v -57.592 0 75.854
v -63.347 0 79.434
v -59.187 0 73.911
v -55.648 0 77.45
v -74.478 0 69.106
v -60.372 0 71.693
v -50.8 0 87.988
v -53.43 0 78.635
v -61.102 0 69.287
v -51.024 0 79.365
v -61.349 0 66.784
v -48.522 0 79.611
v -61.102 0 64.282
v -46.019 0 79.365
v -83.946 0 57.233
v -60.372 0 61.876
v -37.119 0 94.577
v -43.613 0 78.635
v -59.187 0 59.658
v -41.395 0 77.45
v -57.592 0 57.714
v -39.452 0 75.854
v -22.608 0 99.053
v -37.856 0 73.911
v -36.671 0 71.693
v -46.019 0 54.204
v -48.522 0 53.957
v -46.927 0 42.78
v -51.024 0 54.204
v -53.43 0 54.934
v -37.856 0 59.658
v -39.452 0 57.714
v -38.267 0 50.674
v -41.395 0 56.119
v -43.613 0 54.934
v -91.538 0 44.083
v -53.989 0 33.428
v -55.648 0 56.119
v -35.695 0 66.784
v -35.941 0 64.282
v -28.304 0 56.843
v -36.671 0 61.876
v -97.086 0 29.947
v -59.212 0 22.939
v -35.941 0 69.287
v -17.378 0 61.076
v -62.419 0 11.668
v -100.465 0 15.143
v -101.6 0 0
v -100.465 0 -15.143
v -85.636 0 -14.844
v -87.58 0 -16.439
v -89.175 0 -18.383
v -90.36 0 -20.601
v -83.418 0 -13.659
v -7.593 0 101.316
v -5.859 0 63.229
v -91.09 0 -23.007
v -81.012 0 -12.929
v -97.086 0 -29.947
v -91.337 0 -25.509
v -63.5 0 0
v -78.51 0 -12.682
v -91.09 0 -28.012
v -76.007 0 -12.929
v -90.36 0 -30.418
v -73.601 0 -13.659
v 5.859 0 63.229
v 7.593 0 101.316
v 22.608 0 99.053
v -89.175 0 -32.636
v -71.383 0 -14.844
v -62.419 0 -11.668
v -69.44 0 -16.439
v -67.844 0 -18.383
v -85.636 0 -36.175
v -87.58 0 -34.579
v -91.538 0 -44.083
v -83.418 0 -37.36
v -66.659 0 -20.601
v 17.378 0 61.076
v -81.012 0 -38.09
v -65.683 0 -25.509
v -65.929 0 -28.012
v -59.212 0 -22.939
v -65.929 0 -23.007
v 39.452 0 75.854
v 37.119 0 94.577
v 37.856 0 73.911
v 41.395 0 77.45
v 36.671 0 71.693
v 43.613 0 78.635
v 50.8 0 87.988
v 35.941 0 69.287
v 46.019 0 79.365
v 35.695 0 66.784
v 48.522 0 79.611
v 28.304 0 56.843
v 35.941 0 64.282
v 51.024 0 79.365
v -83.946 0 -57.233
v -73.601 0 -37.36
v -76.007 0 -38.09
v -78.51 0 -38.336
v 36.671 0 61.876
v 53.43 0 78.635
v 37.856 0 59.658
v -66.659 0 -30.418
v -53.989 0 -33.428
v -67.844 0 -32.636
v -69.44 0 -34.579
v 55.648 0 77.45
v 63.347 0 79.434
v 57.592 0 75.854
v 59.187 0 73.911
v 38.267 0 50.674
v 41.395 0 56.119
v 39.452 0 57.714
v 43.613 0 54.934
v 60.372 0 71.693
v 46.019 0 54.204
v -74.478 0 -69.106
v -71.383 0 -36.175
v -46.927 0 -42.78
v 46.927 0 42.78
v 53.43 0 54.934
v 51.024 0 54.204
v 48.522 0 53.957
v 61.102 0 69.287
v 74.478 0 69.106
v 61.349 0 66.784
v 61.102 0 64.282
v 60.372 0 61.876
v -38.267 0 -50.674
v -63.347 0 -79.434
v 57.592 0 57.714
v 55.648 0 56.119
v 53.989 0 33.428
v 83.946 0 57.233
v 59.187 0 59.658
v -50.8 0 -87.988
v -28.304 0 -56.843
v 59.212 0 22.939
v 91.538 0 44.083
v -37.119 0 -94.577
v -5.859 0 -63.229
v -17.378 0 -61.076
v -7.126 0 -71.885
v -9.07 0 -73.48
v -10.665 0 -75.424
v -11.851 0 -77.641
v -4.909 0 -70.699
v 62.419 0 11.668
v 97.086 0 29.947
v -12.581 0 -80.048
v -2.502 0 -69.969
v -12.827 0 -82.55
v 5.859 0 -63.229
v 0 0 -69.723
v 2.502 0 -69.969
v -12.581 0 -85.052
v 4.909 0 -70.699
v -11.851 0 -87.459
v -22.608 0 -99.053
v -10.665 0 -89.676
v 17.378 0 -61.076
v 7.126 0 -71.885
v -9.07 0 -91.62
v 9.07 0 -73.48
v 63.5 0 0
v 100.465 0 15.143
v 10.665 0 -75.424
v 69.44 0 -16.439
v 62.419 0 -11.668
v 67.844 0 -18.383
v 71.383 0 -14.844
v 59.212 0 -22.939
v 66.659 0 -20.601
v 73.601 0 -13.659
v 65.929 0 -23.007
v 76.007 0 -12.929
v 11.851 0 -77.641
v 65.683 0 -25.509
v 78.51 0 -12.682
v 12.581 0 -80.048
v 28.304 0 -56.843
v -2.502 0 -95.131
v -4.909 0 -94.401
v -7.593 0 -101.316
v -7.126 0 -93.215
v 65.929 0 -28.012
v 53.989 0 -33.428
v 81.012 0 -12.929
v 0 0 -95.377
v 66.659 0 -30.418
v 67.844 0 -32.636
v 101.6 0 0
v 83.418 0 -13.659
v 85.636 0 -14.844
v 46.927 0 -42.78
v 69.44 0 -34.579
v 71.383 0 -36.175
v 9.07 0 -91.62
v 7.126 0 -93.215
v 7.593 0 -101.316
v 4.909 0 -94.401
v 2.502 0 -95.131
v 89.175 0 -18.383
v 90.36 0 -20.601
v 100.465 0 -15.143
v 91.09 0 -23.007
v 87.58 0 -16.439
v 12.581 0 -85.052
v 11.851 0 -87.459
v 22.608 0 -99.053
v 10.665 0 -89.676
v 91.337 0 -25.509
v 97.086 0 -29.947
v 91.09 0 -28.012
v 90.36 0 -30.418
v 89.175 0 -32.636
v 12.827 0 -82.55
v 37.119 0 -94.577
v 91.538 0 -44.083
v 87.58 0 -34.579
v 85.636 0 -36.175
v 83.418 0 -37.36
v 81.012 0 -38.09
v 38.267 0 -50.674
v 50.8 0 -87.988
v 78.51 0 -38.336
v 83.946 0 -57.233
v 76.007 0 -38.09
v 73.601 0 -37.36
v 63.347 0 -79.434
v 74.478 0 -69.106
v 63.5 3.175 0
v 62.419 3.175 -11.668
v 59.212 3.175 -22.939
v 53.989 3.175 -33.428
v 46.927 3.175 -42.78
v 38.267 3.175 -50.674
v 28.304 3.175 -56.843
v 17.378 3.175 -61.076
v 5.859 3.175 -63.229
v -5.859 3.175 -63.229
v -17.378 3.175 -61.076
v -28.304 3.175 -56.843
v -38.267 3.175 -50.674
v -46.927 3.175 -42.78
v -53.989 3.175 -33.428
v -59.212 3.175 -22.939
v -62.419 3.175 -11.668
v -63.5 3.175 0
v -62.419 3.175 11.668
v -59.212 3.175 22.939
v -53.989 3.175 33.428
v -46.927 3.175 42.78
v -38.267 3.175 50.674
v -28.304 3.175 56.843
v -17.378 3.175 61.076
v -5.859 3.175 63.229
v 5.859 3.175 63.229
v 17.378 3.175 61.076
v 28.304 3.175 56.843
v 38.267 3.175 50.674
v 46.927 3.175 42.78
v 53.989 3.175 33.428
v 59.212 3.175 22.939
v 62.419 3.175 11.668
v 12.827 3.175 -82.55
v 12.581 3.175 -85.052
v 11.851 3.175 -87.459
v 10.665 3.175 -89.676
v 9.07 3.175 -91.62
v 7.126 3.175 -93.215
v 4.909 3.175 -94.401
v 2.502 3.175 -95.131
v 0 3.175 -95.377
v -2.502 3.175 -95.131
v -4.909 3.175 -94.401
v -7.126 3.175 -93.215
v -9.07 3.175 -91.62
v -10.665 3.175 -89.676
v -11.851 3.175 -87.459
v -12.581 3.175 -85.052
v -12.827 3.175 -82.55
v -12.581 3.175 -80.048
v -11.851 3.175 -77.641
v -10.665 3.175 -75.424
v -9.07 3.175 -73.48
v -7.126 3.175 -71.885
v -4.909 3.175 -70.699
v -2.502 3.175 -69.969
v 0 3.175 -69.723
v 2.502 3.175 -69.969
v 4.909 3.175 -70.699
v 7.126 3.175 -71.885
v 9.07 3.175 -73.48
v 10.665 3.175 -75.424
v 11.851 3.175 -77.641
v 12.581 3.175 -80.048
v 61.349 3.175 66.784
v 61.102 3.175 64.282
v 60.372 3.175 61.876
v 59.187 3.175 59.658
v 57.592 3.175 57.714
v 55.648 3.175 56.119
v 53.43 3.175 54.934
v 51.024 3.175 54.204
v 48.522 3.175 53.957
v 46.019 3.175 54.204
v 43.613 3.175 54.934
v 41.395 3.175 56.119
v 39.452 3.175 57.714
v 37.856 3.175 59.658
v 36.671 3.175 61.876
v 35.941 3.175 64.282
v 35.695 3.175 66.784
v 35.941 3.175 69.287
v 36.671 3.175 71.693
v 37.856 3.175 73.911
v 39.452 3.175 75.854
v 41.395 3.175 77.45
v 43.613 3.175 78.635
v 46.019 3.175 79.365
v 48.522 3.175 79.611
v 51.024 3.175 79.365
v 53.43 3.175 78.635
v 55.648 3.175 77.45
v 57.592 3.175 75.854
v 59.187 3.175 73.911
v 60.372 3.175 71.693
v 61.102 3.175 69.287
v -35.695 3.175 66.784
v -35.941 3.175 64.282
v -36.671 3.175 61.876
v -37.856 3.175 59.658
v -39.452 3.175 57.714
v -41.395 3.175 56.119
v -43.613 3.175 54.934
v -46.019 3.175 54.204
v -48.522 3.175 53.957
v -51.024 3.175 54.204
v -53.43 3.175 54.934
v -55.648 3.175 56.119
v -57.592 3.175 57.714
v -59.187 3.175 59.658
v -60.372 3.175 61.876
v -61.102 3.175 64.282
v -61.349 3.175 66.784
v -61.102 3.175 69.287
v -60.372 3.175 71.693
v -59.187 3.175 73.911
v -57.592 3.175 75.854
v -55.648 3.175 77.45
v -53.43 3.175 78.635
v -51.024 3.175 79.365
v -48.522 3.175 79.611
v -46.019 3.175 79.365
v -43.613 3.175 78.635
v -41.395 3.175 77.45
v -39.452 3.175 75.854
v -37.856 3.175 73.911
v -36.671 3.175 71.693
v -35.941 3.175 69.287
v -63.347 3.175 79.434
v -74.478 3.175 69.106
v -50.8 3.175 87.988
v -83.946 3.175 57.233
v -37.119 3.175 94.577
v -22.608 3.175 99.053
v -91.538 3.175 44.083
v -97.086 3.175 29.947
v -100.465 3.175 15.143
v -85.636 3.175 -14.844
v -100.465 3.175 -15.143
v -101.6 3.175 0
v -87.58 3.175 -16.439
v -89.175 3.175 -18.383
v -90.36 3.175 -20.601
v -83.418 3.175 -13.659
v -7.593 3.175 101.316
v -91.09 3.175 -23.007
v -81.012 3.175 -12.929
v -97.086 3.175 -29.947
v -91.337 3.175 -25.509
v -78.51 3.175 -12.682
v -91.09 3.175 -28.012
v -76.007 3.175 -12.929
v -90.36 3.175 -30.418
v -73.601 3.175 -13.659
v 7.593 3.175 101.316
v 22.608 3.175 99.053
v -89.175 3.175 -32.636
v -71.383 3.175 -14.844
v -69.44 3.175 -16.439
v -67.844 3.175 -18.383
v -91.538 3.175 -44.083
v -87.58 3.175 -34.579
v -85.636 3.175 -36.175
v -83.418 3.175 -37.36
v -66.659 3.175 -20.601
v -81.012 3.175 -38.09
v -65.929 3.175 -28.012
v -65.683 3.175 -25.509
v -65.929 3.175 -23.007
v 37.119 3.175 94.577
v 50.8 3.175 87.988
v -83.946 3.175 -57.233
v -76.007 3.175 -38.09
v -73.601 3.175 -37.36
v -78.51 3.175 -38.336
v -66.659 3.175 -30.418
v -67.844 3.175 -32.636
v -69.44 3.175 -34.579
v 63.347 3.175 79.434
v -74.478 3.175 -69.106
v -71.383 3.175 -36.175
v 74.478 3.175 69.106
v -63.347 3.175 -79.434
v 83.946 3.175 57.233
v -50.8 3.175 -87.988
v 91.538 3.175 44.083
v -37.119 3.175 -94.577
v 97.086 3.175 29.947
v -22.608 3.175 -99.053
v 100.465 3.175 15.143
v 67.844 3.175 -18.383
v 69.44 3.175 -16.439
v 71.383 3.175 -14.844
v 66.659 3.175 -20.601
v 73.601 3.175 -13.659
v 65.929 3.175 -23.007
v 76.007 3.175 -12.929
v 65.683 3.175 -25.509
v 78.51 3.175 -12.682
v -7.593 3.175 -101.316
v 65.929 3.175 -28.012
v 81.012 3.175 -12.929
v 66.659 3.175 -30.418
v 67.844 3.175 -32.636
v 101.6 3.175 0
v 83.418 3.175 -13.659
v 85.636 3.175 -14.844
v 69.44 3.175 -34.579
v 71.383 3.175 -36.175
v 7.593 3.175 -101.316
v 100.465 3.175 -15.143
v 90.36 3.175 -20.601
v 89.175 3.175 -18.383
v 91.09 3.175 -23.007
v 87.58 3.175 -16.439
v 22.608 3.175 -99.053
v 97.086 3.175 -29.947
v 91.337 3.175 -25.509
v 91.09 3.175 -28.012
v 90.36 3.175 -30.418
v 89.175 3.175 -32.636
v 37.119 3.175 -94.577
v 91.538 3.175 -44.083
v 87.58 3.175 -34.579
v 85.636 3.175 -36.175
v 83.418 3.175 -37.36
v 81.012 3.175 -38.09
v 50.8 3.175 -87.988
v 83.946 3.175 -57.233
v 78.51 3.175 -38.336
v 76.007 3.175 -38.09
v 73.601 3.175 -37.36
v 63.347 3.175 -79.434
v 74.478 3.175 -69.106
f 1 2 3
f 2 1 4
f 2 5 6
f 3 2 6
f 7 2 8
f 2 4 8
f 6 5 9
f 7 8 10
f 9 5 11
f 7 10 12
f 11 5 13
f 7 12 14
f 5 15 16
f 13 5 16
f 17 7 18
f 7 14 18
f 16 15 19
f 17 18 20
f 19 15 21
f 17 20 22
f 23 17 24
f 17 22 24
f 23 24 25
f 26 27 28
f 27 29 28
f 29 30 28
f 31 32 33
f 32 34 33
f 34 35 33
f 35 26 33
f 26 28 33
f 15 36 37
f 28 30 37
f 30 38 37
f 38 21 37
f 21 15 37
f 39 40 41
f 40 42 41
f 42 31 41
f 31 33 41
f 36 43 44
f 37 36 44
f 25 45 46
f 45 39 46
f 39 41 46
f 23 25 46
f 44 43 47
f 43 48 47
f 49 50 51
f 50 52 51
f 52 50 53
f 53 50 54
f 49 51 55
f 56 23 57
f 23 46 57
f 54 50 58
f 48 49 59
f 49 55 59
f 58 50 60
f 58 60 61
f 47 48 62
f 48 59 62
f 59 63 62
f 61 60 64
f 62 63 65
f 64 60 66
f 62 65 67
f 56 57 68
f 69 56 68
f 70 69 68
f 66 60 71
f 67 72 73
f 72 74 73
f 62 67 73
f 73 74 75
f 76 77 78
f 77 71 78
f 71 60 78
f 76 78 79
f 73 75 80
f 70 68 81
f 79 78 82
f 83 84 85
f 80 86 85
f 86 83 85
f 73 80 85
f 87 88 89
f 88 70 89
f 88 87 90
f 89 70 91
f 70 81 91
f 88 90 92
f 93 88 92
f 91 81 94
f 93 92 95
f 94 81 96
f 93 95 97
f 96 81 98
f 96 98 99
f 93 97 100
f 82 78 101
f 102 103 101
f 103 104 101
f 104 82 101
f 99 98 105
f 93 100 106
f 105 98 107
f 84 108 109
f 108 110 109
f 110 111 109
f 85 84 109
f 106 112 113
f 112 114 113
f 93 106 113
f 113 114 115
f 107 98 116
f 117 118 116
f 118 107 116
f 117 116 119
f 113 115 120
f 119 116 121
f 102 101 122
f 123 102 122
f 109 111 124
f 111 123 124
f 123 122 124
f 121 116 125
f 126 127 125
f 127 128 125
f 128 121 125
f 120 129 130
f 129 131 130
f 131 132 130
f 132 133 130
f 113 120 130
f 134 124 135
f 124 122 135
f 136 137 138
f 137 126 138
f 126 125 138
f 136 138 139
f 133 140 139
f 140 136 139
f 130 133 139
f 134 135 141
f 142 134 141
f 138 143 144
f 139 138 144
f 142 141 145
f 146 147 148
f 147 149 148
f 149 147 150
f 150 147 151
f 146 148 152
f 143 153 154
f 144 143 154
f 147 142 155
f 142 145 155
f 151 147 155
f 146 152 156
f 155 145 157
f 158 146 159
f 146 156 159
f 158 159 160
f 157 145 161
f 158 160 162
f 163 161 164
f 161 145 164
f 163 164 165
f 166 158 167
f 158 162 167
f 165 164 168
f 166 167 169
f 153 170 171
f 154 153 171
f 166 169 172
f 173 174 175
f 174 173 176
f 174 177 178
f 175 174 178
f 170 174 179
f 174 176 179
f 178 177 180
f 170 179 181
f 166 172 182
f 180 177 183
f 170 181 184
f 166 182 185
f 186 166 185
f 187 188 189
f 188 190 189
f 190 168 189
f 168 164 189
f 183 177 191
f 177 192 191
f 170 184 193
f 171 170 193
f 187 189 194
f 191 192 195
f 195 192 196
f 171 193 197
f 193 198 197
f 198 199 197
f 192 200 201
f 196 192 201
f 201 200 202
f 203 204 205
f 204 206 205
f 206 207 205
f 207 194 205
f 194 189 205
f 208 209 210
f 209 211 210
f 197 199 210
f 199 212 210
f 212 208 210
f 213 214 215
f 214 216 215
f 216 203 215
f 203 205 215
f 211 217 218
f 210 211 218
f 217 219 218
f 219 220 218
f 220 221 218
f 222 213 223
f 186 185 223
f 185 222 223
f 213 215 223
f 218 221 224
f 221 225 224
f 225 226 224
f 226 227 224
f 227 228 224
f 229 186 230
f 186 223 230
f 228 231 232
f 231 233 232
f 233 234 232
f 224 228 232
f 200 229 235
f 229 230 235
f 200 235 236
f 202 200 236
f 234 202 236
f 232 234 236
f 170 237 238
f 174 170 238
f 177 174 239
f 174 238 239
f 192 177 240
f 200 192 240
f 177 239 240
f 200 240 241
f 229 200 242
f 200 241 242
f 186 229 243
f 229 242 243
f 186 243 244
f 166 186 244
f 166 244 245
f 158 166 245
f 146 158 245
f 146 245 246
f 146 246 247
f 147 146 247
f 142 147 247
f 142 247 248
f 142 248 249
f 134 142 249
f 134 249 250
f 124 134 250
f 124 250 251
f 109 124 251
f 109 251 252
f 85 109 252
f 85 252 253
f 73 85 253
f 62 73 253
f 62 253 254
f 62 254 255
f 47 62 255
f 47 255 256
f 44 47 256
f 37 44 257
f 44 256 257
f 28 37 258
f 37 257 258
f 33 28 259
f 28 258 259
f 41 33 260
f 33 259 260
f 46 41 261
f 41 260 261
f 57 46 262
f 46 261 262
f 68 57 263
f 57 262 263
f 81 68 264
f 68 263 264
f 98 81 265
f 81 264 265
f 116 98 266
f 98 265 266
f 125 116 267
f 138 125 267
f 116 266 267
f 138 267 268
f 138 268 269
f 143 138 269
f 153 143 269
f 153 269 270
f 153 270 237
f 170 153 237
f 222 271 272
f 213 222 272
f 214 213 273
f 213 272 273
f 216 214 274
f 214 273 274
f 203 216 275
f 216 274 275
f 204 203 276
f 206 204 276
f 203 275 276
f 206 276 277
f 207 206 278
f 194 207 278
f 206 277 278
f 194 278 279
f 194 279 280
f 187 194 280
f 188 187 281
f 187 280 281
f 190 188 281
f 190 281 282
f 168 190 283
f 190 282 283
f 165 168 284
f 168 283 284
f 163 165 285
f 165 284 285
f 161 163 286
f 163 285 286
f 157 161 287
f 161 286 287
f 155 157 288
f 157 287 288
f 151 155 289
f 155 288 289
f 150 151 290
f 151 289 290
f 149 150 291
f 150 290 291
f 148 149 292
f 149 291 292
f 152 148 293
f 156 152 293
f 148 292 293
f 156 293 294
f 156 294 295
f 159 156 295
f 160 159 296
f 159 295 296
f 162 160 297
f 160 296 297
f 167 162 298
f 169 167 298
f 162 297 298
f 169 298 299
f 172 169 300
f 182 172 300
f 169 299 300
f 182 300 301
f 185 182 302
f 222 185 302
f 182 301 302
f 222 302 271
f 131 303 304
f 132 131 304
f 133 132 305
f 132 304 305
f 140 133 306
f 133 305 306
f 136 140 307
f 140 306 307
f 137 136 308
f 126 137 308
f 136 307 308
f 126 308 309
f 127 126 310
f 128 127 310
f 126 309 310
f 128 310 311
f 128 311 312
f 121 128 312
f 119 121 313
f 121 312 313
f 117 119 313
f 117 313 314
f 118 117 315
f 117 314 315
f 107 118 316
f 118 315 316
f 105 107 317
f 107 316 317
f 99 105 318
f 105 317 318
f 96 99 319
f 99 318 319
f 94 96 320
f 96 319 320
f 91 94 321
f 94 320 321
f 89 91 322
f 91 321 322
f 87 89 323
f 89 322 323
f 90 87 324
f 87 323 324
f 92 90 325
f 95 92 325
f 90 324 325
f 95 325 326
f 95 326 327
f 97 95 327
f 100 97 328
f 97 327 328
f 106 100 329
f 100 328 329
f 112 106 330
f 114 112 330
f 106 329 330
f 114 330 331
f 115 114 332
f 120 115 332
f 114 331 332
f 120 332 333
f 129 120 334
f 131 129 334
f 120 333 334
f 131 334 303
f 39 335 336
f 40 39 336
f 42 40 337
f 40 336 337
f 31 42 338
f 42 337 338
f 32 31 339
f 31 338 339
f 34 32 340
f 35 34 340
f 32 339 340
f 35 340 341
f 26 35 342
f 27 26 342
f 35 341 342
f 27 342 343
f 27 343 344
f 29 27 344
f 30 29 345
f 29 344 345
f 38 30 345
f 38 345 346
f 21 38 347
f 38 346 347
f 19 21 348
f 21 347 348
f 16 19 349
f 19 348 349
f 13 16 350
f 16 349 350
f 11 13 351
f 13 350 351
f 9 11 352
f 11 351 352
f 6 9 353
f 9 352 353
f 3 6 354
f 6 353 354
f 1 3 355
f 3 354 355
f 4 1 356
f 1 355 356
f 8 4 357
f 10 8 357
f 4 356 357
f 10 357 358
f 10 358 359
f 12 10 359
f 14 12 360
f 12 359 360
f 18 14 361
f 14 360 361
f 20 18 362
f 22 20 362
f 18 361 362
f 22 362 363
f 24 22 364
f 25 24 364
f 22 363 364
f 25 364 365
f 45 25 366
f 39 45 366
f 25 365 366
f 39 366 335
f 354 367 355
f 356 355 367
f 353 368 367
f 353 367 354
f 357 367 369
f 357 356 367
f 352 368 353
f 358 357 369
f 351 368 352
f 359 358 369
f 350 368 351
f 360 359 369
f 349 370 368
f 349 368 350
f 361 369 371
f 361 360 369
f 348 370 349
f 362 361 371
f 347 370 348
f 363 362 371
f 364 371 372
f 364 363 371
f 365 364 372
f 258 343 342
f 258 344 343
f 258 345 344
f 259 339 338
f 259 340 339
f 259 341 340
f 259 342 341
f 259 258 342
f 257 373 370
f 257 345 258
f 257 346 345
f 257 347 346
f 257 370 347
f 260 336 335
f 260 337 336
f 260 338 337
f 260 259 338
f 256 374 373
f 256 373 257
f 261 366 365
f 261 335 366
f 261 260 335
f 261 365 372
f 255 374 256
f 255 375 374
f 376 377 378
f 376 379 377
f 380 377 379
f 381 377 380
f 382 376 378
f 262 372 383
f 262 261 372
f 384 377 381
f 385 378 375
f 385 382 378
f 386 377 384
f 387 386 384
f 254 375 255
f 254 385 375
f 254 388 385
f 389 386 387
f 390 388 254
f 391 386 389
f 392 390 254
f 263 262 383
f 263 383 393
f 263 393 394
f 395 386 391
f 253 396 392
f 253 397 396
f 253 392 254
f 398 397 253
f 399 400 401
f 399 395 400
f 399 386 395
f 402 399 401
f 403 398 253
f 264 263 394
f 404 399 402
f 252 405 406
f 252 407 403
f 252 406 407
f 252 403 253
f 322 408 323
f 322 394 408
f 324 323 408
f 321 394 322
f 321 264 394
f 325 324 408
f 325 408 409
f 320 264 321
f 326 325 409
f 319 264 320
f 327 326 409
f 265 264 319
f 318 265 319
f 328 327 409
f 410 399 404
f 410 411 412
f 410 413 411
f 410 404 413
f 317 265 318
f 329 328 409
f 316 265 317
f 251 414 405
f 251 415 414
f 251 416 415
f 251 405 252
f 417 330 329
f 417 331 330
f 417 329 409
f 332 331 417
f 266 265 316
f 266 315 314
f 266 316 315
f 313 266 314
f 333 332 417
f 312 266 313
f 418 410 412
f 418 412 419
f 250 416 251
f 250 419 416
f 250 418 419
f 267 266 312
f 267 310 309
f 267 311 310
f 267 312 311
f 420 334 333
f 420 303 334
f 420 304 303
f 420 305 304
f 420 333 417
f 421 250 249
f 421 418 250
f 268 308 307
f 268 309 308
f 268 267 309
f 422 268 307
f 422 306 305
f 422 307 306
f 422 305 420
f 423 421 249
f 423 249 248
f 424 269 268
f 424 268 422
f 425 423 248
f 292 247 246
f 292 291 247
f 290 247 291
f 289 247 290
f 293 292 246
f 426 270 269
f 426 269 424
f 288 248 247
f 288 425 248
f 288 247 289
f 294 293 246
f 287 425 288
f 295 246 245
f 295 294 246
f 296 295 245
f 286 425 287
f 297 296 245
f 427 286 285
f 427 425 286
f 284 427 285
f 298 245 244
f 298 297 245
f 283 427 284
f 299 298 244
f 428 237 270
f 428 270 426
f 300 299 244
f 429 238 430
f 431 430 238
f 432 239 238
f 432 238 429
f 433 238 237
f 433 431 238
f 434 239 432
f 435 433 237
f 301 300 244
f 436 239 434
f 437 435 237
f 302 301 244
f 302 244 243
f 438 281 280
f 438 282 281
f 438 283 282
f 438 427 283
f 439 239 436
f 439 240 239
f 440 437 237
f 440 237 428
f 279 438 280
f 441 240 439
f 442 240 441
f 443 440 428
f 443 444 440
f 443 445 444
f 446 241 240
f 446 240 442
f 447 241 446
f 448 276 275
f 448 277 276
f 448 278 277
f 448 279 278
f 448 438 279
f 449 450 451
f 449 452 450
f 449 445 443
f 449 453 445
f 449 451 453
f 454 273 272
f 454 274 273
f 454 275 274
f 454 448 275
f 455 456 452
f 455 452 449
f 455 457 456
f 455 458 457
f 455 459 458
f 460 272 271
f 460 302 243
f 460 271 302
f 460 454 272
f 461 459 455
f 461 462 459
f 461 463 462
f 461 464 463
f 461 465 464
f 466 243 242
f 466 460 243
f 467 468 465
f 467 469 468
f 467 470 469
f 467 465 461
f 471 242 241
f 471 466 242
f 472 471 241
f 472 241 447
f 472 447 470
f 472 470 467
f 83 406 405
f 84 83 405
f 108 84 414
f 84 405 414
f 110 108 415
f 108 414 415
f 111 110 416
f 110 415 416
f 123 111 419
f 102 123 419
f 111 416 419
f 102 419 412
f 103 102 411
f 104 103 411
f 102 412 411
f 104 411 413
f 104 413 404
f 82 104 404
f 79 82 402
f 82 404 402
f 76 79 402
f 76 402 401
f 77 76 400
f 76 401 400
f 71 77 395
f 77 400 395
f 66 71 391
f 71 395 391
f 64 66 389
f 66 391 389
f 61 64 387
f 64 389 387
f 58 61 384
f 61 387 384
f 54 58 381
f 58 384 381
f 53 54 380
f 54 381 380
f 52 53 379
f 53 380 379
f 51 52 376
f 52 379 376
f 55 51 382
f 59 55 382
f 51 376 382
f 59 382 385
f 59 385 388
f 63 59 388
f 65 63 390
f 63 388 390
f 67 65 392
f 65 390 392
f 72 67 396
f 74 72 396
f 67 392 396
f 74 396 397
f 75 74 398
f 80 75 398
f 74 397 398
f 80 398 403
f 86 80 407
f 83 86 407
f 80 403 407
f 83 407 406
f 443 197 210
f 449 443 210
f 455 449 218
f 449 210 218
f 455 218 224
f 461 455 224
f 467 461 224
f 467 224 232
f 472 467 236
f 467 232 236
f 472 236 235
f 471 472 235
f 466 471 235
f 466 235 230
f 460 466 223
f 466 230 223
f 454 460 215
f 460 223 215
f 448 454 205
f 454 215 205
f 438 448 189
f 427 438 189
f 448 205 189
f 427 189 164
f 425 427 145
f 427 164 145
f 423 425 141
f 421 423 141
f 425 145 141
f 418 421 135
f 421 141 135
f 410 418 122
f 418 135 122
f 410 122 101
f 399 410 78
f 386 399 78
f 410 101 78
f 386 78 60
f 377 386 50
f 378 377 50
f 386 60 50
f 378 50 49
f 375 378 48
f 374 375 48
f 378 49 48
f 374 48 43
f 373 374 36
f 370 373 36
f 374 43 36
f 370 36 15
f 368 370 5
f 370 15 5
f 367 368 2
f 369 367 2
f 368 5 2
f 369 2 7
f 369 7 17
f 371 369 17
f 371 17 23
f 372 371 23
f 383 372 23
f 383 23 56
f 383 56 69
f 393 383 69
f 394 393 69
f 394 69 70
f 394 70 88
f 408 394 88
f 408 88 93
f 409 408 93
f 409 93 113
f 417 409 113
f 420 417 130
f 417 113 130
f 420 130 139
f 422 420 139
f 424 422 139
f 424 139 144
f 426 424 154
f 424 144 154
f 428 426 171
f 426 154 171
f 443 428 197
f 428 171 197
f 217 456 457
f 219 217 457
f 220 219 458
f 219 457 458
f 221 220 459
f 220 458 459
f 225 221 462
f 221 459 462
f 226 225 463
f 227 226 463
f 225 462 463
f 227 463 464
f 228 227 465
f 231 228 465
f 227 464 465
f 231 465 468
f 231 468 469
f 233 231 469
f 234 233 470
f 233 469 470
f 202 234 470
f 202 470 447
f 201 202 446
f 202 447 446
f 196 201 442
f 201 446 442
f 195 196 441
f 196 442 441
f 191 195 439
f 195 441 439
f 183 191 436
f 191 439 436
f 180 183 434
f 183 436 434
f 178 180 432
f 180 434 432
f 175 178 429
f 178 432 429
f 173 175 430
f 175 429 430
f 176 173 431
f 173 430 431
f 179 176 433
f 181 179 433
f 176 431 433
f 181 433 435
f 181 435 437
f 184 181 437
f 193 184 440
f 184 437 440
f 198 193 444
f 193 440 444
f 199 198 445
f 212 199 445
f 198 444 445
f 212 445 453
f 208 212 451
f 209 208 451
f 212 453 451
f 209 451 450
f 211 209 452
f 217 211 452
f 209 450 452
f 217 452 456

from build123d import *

# Parameters (mm, degrees)
SKETCH1_R           = 101.6
BOSS_EXTRUDE1_DEPTH = 3.175
SKETCH2_R           = 12.827
CUT_EXTRUDE1_DEPTH  = 3.175
SKETCH3_R           = 63.5
CUT_EXTRUDE2_DEPTH  = 4.175


with BuildPart() as part:
    # Sketch1 → Boss-Extrude1 (new body)
    with BuildSketch(Plane(origin=(0, 0, 0), x_dir=(1, 0, 0), z_dir=(0, 1, 0))):
        Circle(SKETCH1_R)
    extrude(amount=BOSS_EXTRUDE1_DEPTH)

    # Sketch2 → Cut-Extrude1 (cut)
    with BuildSketch(Plane(origin=(0, 3.175, 0), x_dir=(1, 0, 0), z_dir=(0, 1, 0))):
        with Locations((0, 82.55)):
            Circle(SKETCH2_R)
        with Locations((78.50971542, 25.509352886)):
            Circle(SKETCH2_R)
        with Locations((48.521672577, -66.784352886)):
            Circle(SKETCH2_R)
        with Locations((-48.521672577, -66.784352886)):
            Circle(SKETCH2_R)
        with Locations((-78.50971542, 25.509352886)):
            Circle(SKETCH2_R)
    extrude(amount=-CUT_EXTRUDE1_DEPTH, mode=Mode.SUBTRACT)

    # Sketch3 → Cut-Extrude2 (cut, through all)
    with BuildSketch(Plane(origin=(0, 3.175, 0), x_dir=(1, 0, 0), z_dir=(0, 1, 0))):
        Circle(SKETCH3_R)
    extrude(amount=-CUT_EXTRUDE2_DEPTH, mode=Mode.SUBTRACT)


solid = part.part
